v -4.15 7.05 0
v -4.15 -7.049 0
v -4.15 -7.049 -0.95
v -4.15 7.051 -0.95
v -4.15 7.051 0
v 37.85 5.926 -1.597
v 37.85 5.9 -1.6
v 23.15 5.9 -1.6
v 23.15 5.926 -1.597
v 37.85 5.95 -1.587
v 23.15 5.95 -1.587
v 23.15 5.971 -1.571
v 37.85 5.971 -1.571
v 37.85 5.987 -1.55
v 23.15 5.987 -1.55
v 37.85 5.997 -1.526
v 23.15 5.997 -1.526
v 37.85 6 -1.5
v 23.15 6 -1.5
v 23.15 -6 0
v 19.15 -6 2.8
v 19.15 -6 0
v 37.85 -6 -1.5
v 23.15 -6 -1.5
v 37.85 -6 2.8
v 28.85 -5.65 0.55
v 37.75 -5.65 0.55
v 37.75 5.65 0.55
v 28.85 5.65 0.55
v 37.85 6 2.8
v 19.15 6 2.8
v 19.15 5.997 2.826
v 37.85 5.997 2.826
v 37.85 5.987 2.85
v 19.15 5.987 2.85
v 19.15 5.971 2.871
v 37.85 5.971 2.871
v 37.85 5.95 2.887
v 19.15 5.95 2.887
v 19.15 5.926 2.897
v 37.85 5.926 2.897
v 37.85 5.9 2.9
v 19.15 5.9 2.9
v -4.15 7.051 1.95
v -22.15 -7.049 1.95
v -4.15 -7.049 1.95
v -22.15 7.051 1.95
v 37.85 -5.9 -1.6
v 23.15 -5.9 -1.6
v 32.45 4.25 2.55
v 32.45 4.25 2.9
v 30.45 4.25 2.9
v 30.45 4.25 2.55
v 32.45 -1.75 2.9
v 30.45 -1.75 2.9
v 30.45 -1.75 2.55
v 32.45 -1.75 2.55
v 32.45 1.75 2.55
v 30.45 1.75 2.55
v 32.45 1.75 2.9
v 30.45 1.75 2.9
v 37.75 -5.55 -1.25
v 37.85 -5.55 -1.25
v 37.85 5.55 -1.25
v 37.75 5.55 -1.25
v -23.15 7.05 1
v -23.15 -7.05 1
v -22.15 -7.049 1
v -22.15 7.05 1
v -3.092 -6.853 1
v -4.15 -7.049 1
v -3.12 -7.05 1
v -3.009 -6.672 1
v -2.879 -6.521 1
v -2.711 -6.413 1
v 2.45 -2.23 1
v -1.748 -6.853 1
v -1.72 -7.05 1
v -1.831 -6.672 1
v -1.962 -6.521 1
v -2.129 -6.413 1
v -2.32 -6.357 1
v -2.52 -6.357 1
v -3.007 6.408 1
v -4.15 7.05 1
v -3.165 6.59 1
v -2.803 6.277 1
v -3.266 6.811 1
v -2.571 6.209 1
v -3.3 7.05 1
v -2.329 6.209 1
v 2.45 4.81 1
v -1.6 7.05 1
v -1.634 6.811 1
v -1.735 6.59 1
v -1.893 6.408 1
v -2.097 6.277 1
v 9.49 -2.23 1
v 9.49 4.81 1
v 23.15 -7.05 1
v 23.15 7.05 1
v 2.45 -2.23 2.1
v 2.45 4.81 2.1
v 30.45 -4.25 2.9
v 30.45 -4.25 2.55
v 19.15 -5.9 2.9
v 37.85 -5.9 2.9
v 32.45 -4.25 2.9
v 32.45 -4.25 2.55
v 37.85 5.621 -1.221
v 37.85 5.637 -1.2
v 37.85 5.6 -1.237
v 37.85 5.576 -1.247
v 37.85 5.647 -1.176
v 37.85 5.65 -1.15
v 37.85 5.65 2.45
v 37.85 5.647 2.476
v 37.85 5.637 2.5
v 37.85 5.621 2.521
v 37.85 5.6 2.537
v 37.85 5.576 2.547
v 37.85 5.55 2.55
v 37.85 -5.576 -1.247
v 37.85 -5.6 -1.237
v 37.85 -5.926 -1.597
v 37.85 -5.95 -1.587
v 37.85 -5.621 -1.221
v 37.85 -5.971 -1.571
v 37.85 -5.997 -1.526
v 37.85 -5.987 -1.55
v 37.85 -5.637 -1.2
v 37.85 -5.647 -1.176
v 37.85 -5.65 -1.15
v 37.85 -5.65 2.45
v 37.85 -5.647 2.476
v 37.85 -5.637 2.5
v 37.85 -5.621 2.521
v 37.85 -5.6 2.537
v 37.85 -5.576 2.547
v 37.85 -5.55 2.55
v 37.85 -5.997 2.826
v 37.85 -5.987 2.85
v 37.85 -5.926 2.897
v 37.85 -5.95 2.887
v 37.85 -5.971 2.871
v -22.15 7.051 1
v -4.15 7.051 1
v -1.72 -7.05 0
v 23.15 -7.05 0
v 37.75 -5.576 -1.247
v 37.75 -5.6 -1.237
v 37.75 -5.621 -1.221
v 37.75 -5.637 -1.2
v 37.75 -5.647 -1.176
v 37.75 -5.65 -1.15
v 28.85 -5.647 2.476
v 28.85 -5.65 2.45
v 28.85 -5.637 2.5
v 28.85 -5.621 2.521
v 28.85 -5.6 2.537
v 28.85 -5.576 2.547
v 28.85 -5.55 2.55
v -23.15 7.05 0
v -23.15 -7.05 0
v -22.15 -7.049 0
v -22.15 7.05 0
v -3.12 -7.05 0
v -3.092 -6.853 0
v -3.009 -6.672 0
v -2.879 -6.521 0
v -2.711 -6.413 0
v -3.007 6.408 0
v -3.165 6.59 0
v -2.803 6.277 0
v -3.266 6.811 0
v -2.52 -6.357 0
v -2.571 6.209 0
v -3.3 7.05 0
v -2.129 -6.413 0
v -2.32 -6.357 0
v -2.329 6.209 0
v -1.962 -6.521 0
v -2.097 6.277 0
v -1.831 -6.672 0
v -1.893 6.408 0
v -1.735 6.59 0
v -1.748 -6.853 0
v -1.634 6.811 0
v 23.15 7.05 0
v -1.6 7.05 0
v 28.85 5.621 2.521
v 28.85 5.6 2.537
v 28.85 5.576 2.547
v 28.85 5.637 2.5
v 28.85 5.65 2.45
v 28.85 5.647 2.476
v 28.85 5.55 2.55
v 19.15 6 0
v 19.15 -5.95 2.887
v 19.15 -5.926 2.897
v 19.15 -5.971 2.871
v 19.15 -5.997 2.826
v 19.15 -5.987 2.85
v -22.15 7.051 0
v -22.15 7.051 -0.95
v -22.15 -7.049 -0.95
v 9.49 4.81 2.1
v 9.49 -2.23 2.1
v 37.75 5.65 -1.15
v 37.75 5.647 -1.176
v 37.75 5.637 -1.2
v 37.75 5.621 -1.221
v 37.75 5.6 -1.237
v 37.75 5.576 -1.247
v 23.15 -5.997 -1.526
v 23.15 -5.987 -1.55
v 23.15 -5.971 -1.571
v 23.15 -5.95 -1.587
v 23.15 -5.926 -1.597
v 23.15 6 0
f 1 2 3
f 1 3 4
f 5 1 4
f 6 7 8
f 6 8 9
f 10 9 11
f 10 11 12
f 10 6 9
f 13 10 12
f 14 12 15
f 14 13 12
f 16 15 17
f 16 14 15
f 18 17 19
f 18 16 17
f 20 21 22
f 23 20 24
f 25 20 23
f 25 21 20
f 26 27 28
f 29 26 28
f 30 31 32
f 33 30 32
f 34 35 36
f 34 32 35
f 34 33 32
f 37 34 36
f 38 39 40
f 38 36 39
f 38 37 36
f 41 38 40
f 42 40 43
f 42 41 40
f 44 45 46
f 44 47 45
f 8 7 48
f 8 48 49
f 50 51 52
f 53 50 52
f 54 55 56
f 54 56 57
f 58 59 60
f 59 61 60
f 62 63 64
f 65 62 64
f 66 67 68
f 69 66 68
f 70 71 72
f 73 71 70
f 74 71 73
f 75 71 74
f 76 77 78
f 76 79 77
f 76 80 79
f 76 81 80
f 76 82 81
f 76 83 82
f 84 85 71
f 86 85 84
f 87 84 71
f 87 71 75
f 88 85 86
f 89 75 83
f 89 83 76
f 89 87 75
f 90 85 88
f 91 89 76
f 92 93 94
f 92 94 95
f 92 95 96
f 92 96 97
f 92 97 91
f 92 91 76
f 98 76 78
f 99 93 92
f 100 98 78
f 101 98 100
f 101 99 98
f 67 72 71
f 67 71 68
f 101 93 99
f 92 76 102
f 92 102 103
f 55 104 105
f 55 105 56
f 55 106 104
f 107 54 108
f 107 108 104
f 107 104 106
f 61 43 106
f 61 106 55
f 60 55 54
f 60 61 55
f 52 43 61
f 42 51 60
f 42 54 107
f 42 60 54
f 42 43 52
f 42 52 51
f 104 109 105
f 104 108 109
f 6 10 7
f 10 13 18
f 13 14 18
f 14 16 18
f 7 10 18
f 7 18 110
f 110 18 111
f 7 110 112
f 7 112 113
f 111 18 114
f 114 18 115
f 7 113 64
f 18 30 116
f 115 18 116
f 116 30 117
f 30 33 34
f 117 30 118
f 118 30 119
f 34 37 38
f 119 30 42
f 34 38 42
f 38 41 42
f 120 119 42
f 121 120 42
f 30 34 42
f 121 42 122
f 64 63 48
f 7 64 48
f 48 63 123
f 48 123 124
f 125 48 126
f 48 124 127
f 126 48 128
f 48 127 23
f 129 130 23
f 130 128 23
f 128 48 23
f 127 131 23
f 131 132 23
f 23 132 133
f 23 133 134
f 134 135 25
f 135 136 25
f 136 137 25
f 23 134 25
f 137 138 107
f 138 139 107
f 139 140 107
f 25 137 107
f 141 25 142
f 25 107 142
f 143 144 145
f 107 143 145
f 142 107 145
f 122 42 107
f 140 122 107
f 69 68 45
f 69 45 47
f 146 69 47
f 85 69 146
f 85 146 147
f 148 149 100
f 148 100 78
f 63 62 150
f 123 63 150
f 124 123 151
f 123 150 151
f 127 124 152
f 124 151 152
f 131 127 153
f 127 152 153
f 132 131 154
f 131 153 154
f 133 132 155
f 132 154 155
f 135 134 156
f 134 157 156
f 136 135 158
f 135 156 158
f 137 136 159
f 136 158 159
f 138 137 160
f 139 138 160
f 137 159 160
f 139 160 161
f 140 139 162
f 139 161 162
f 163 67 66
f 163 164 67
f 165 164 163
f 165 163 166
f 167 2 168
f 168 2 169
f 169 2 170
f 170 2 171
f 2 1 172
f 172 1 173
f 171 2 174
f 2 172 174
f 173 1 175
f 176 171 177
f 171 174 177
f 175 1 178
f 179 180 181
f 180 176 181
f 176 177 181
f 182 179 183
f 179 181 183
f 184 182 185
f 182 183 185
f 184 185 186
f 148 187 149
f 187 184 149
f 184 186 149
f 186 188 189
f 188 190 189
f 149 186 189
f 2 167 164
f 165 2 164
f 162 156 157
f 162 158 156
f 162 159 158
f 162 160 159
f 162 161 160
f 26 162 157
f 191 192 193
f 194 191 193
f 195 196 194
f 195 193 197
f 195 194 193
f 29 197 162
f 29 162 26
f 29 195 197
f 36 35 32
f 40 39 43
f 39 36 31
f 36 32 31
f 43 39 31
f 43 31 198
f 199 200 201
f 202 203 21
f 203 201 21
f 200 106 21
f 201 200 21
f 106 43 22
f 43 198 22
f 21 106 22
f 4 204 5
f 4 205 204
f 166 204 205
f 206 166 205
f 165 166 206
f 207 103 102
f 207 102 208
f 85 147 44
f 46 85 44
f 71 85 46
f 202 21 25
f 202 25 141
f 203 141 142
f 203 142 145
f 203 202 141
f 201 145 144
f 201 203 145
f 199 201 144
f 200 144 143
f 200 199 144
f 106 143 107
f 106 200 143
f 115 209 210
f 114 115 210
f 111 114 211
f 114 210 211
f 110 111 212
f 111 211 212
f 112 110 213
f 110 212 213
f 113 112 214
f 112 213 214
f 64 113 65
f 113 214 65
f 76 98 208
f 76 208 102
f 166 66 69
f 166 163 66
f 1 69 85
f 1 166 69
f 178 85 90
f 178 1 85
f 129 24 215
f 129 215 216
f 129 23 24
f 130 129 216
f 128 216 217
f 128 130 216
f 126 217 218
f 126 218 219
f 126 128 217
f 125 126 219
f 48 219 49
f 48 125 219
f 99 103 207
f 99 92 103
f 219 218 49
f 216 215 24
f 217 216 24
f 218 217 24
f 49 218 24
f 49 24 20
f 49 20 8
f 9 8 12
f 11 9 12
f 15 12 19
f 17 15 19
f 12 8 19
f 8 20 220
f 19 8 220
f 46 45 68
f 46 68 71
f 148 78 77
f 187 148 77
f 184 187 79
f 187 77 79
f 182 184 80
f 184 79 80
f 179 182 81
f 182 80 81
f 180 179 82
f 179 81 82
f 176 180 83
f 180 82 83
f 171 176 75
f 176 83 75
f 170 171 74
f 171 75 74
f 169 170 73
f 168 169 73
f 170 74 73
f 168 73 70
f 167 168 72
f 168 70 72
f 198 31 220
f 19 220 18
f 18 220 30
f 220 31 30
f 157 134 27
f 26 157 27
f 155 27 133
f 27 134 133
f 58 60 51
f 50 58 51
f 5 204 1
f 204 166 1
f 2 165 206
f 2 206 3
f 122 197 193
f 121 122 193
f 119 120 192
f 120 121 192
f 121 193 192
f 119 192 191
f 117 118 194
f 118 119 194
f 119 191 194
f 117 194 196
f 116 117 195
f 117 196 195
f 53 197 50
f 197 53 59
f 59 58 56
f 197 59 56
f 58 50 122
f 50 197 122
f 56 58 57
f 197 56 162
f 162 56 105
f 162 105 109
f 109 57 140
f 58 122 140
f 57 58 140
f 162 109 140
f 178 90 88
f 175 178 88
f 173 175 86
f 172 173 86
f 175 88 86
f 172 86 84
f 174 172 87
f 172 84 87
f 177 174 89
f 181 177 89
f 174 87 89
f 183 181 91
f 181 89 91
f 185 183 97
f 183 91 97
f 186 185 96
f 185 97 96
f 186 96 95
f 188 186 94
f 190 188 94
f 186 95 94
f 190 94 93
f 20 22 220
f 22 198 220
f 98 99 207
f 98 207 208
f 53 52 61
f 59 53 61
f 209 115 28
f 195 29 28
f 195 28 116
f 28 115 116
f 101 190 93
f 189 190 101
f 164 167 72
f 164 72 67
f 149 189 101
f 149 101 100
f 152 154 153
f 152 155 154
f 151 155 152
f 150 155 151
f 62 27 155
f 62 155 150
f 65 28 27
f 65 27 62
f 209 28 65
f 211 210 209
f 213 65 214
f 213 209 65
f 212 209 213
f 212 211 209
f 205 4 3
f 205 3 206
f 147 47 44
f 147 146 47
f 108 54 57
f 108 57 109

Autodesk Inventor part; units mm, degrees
ref_plane "YZ Plane" through (0, 0, 0) normal (1, 0, 0) x (0, 1, 0)
ref_plane "XZ Plane" through (0, 0, 0) normal (0, 1, 0) x (-1, 0, 0)
ref_plane "XY Plane" through (0, 0, 0) normal (0, 0, 1) x (1, 0, 0)
sketch "Skizze1" plane through (0, 0, 0) normal (0, 0, 1) x (1, 0, 0)
  line L0 (-23.15, 7.05) -> (23.15, 7.05)
  line L1 (23.15, 7.05) -> (23.15, -7.05)
  line L2 (23.15, -7.05) -> (-23.15, -7.05)
  line L3 (-23.15, -7.05) -> (-23.15, 7.05)
  line L4 (-23.15, 7.05) -> (23.15, -7.05) construction
  point P0 (0, 0)
  point P1 (0, 0)
  dimension "d0" = 46.3
  dimension "d1" = 14.1
extrude "Extrusion1" add sketch "Skizze1" along normal blind 1
sketch "Skizze3" plane through (0, 0, 0) normal (0, 0, 1) x (1, 0, 0)
  line L0 (37.85, 6) -> (19.15, 6)
  line L1 (19.15, 6) -> (19.15, -6)
  line L2 (19.15, -6) -> (37.85, -6)
  line L3 (37.85, -6) -> (37.85, 6)
  line L4 (23.15, -7.05) -> (23.15, 7.05) projected
  line L5 (23.15, 0) -> (19.15, 0) construction
  point P0 (0, 0)
  dimension "d8" = 18.7
  dimension "d9" = 12
extrude "Extrusion2" add sketch "Skizze3" along normal blind 2.9 separate body
sketch "Skizze4" plane through (0, 0, 0) normal (0, 0, -1) x (-1, 0, 0)
  line L0 (-19.15, -6) -> (-37.85, -6) projected
  line L1 (-23.15, -7.05) -> (-23.15, 7.05) projected
  line L2 (-37.85, -6) -> (-23.15, -6)
  line L3 (-23.15, -6) -> (-23.15, 6)
  line L4 (-23.15, 6) -> (-37.85, 6)
  line L5 (-37.85, 6) -> (-37.85, -6)
  point P0 (0, 0)
  dimension "d16" = 12
extrude "Extrusion3" add sketch "Skizze4" along normal blind 1.6 bodies 2
sketch "Skizze5" plane through (0, 0, 1) normal (0, 0, 1) x (1, 0, 0)
  line L0 (-23.15, 7.05) -> (-23.15, -7.05) construction
  line L1 (23.15, 7.05) -> (-23.15, 7.05) construction
  line L2 (-22.15, 7.05) -> (-4.15, 7.05)
  line L3 (-4.15, 7.05) -> (-4.15, -7.05)
  line L4 (-4.15, -7.05) -> (-22.15, -7.05)
  line L5 (-22.15, -7.05) -> (-22.15, 7.05)
  point P0 (0, 0)
  dimension "d20" = 18
  dimension "d21" = 14.1
extrude "Extrusion4" add sketch "Skizze5" along normal blind 0.95 bodies 1
sketch "Skizze6" plane through (0, 0, 0) normal (0, 0, -1) x (-1, 0, 0)
  line L0 (23.15, 7.05) -> (23.15, -7.05) construction
  line L1 (23.15, 0) -> (22.15, 0) construction
  line L2 (22.15, 7.05) -> (22.15, -7.05) projected
  line L3 (22.15, -7.05) -> (4.15, -7.05)
  line L4 (4.15, -7.05) -> (4.15, 7.05)
  line L5 (4.15, 7.05) -> (22.15, 7.05)
  line L6 (22.15, 7.05) -> (22.15, -7.05)
  point P0 (0, 0)
  dimension "d24" = 1
  dimension "d25" = 18
  dimension "d26" = 14.1
extrude "Extrusion5" add sketch "Skizze6" along normal blind 0.95 bodies 1
sketch "Skizze8" plane through (37.85, -6, 2.9) normal (1, 0, 0) x (0, 0, -1)
  line L0 (4.5, 12) -> (4.5, 0) projected
  line L1 (0, 0) -> (0, 12) projected
  line L2 (0.35, 0.35) -> (2.35, 0.35)
  line L3 (2.35, 0.35) -> (2.35, 11.65)
  line L4 (2.35, 11.65) -> (0.35, 11.65)
  line L5 (0.35, 11.65) -> (0.35, 0.35)
  line L6 (0, 12) -> (0, 0) construction
  line L7 (0, 6) -> (0.35, 6) construction
  dimension "d42" = 2
  dimension "d43" = 11.3
  dimension "d44" = 0.35
extrude "Extrusion6" cut sketch "Skizze8" against normal blind 9 bodies 2
sketch "Skizze9" plane through (37.85, -6, 2.9) normal (1, 0, 0) x (0, 0, -1)
  line L0 (0, 0) -> (0, 12) projected
  line L1 (4.5, 12) -> (4.5, 0) projected
  line L2 (2.35, 11.65) -> (2.35, 0.35) projected
  line L3 (2.35, 0.35) -> (4.15, 0.35)
  line L4 (4.15, 0.35) -> (4.15, 11.65)
  line L5 (4.15, 11.65) -> (2.35, 11.65)
  line L6 (2.35, 11.65) -> (2.35, 0.35)
  point P0 (2.9, 6)
extrude "Extrusion7" cut sketch "Skizze9" against normal blind 0.1 bodies 2
sketch "Skizze15" plane through (0, 0, 1) normal (0, 0, 1) x (1, 0, 0)
  line L0 (-4.1196, -7.0919) -> (-2.4201, -7.05) construction
  line L1 (-4.15, -7.05) -> (23.15, -7.05) construction
  circle A0 centre (-2.4201, -7.05) radius 0.7
  point P0 (0, 0)
  dimension "d81" = 1.7
  dimension "d82" = 1.4
extrude "Extrusion8" cut sketch "Skizze15" against normal blind 1 bodies 1
sketch "Skizze17" plane through (0, 0, 1) normal (0, 0, 1) x (1, 0, 0)
  line L0 (-4.15, 7.05) -> (-22.15, 7.05) projected
  line L1 (-4.15, 7.05) -> (-2.45, 7.05)
  line L2 (23.15, 7.05) -> (-4.15, 7.05) projected
  circle A0 centre (-2.45, 7.05) radius 0.85
  point P0 (0, 0)
  dimension "d87" = 1.7
  dimension "d88" = 1.7
extrude "Extrusion9" cut sketch "Skizze17" against normal blind 1 bodies 1
sketch "Skizze19" plane through (0, 0, 2.9) normal (0, 0, 1) x (1, 0, 0)
  line L0 (37.85, -6) -> (37.85, 6) projected
  line L1 (32.45, -4.25) -> (30.45, -4.25)
  line L2 (30.45, -4.25) -> (30.45, -1.75)
  line L3 (30.45, -1.75) -> (32.45, -1.75)
  line L4 (32.45, -1.75) -> (32.45, -4.25)
  point P0 (0, 0)
  point P1 (32.45, 4.25)
  dimension "d101" = 2
  dimension "d102" = 2.5
extrude "Extrusion10" cut sketch "Skizze19" against normal up to next bodies 2
sketch "Skizze20" plane through (0, 0, 2.9) normal (0, 0, 1) x (1, 0, 0)
  line L0 (37.85, 5.65) -> (37.85, -5.65) projected
  line L1 (37.85, 0) -> (32.45, 0)
  line L2 (32.45, 0) -> (32.45, 4.25)
  line L3 (32.45, 4.25) -> (30.45, 4.25)
  line L4 (30.45, 4.25) -> (30.45, 1.75)
  line L5 (30.45, 1.75) -> (32.45, 1.75)
  line L6 (32.45, 1.75) -> (32.45, 4.25)
  point P0 (0, 0)
  dimension "d107" = 5.4
  dimension "d108" = 4.25
  dimension "d109" = 2
  dimension "d110" = 2.5
extrude "Extrusion11" cut sketch "Skizze20" against normal up to next bodies 2
fillet "Rundung1" radius 0.1 2 edges at (28.5, -6, 2.9) (28.5, 6, 2.9)
fillet "Rundung3" radius 0.1 1 edges at (30.5, -6, -1.6)
fillet "Rundung4" radius 0.1 1 edges at (30.5, 6, -1.6)
fillet "Rundung5" radius 0.1 1 edges at (37.8, -5.65, -1.25)
fillet "Rundung6" radius 0.1 1 edges at (33.35, -5.65, 2.55)
fillet "Rundung7" radius 0.1 1 edges at (37.8, 5.65, -1.25)
fillet "Rundung8" radius 0.1 1 edges at (33.35, 5.65, 2.55)
sketch "Skizze21" plane through (0, 0, 1) normal (0, 0, 1) x (1, 0, 0)
  line L0 (2.45, 4.81) -> (9.49, 4.81)
  line L1 (9.49, 4.81) -> (9.49, -2.23)
  line L2 (9.49, -2.23) -> (2.45, -2.23)
  line L3 (2.45, -2.23) -> (2.45, 4.81)
  line L4 (19.15, 5.9) -> (19.15, -5.9) construction
  line L5 (-4.15, -7.05) -> (-4.15, 7.05) construction
  line L6 (-4.15, 7.05) -> (2.45, 7.05) construction
  line L7 (2.45, 7.05) -> (2.45, 4.81) construction
  line L8 (2.45, 4.81) -> (-4.15, 4.81) construction
  line L9 (-4.15, 4.81) -> (-4.15, 7.05) construction
  point P0 (0, 0)
  dimension "d121" = 7.04
  dimension "d122" = 7.04
  dimension "d125" = 6.6
  dimension "d126" = 2.24
extrude "Extrusion12" add sketch "Skizze21" along normal blind 1.1 bodies 1
sketch "Skizze22" plane through (-23.15, -7.05, 0) normal (0, -1, 0) x (1, 0, 0)
  line L0 (19, 1.95) -> (1, 1.95) projected
  line L1 (19, 1) -> (20.0299, 1) projected
  line L2 (1, 1.95) -> (19, 1.95)
  line L3 (19, 1.95) -> (19, 1)
  line L4 (19, 1) -> (1, 1)
  line L5 (1, 1) -> (1, 1.95)
  line L6 (1, -0.95) -> (19, -0.95) projected
  line L7 (19, 0) -> (1, 0)
  line L8 (1, 0) -> (1, -0.95)
  line L9 (1, -0.95) -> (19, -0.95)
  line L10 (19, -0.95) -> (19, 0)
  point P0 (23.15, 0)
extrude "Extrusion13" cut sketch "Skizze22" against normal blind 0.001 bodies 1
sketch "Skizze23" plane through (-23.15, 7.05, 1) normal (0, 1, 0) x (1, 0, 0)
  line L0 (19, 0) -> (19, -0.95) projected
  line L1 (19, -0.95) -> (1, -0.95)
  line L2 (1, -0.95) -> (1, 0)
  line L3 (1, 0) -> (19, 0)
  line L4 (19, 0) -> (19, -0.95)
  line L5 (1, 1) -> (1, 1.95) projected
  line L6 (19, 1) -> (19, 1.95) projected
  line L7 (1, 1) -> (19, 1)
  line L8 (19, 1) -> (19, 1.95)
  line L9 (19, 1.95) -> (1, 1.95)
  line L10 (1, 1.95) -> (1, 1)
  point P0 (23.15, 1)
extrude "Extrusion14" add sketch "Skizze23" along normal blind 0.001 bodies 1
properties part number "USB stick"
